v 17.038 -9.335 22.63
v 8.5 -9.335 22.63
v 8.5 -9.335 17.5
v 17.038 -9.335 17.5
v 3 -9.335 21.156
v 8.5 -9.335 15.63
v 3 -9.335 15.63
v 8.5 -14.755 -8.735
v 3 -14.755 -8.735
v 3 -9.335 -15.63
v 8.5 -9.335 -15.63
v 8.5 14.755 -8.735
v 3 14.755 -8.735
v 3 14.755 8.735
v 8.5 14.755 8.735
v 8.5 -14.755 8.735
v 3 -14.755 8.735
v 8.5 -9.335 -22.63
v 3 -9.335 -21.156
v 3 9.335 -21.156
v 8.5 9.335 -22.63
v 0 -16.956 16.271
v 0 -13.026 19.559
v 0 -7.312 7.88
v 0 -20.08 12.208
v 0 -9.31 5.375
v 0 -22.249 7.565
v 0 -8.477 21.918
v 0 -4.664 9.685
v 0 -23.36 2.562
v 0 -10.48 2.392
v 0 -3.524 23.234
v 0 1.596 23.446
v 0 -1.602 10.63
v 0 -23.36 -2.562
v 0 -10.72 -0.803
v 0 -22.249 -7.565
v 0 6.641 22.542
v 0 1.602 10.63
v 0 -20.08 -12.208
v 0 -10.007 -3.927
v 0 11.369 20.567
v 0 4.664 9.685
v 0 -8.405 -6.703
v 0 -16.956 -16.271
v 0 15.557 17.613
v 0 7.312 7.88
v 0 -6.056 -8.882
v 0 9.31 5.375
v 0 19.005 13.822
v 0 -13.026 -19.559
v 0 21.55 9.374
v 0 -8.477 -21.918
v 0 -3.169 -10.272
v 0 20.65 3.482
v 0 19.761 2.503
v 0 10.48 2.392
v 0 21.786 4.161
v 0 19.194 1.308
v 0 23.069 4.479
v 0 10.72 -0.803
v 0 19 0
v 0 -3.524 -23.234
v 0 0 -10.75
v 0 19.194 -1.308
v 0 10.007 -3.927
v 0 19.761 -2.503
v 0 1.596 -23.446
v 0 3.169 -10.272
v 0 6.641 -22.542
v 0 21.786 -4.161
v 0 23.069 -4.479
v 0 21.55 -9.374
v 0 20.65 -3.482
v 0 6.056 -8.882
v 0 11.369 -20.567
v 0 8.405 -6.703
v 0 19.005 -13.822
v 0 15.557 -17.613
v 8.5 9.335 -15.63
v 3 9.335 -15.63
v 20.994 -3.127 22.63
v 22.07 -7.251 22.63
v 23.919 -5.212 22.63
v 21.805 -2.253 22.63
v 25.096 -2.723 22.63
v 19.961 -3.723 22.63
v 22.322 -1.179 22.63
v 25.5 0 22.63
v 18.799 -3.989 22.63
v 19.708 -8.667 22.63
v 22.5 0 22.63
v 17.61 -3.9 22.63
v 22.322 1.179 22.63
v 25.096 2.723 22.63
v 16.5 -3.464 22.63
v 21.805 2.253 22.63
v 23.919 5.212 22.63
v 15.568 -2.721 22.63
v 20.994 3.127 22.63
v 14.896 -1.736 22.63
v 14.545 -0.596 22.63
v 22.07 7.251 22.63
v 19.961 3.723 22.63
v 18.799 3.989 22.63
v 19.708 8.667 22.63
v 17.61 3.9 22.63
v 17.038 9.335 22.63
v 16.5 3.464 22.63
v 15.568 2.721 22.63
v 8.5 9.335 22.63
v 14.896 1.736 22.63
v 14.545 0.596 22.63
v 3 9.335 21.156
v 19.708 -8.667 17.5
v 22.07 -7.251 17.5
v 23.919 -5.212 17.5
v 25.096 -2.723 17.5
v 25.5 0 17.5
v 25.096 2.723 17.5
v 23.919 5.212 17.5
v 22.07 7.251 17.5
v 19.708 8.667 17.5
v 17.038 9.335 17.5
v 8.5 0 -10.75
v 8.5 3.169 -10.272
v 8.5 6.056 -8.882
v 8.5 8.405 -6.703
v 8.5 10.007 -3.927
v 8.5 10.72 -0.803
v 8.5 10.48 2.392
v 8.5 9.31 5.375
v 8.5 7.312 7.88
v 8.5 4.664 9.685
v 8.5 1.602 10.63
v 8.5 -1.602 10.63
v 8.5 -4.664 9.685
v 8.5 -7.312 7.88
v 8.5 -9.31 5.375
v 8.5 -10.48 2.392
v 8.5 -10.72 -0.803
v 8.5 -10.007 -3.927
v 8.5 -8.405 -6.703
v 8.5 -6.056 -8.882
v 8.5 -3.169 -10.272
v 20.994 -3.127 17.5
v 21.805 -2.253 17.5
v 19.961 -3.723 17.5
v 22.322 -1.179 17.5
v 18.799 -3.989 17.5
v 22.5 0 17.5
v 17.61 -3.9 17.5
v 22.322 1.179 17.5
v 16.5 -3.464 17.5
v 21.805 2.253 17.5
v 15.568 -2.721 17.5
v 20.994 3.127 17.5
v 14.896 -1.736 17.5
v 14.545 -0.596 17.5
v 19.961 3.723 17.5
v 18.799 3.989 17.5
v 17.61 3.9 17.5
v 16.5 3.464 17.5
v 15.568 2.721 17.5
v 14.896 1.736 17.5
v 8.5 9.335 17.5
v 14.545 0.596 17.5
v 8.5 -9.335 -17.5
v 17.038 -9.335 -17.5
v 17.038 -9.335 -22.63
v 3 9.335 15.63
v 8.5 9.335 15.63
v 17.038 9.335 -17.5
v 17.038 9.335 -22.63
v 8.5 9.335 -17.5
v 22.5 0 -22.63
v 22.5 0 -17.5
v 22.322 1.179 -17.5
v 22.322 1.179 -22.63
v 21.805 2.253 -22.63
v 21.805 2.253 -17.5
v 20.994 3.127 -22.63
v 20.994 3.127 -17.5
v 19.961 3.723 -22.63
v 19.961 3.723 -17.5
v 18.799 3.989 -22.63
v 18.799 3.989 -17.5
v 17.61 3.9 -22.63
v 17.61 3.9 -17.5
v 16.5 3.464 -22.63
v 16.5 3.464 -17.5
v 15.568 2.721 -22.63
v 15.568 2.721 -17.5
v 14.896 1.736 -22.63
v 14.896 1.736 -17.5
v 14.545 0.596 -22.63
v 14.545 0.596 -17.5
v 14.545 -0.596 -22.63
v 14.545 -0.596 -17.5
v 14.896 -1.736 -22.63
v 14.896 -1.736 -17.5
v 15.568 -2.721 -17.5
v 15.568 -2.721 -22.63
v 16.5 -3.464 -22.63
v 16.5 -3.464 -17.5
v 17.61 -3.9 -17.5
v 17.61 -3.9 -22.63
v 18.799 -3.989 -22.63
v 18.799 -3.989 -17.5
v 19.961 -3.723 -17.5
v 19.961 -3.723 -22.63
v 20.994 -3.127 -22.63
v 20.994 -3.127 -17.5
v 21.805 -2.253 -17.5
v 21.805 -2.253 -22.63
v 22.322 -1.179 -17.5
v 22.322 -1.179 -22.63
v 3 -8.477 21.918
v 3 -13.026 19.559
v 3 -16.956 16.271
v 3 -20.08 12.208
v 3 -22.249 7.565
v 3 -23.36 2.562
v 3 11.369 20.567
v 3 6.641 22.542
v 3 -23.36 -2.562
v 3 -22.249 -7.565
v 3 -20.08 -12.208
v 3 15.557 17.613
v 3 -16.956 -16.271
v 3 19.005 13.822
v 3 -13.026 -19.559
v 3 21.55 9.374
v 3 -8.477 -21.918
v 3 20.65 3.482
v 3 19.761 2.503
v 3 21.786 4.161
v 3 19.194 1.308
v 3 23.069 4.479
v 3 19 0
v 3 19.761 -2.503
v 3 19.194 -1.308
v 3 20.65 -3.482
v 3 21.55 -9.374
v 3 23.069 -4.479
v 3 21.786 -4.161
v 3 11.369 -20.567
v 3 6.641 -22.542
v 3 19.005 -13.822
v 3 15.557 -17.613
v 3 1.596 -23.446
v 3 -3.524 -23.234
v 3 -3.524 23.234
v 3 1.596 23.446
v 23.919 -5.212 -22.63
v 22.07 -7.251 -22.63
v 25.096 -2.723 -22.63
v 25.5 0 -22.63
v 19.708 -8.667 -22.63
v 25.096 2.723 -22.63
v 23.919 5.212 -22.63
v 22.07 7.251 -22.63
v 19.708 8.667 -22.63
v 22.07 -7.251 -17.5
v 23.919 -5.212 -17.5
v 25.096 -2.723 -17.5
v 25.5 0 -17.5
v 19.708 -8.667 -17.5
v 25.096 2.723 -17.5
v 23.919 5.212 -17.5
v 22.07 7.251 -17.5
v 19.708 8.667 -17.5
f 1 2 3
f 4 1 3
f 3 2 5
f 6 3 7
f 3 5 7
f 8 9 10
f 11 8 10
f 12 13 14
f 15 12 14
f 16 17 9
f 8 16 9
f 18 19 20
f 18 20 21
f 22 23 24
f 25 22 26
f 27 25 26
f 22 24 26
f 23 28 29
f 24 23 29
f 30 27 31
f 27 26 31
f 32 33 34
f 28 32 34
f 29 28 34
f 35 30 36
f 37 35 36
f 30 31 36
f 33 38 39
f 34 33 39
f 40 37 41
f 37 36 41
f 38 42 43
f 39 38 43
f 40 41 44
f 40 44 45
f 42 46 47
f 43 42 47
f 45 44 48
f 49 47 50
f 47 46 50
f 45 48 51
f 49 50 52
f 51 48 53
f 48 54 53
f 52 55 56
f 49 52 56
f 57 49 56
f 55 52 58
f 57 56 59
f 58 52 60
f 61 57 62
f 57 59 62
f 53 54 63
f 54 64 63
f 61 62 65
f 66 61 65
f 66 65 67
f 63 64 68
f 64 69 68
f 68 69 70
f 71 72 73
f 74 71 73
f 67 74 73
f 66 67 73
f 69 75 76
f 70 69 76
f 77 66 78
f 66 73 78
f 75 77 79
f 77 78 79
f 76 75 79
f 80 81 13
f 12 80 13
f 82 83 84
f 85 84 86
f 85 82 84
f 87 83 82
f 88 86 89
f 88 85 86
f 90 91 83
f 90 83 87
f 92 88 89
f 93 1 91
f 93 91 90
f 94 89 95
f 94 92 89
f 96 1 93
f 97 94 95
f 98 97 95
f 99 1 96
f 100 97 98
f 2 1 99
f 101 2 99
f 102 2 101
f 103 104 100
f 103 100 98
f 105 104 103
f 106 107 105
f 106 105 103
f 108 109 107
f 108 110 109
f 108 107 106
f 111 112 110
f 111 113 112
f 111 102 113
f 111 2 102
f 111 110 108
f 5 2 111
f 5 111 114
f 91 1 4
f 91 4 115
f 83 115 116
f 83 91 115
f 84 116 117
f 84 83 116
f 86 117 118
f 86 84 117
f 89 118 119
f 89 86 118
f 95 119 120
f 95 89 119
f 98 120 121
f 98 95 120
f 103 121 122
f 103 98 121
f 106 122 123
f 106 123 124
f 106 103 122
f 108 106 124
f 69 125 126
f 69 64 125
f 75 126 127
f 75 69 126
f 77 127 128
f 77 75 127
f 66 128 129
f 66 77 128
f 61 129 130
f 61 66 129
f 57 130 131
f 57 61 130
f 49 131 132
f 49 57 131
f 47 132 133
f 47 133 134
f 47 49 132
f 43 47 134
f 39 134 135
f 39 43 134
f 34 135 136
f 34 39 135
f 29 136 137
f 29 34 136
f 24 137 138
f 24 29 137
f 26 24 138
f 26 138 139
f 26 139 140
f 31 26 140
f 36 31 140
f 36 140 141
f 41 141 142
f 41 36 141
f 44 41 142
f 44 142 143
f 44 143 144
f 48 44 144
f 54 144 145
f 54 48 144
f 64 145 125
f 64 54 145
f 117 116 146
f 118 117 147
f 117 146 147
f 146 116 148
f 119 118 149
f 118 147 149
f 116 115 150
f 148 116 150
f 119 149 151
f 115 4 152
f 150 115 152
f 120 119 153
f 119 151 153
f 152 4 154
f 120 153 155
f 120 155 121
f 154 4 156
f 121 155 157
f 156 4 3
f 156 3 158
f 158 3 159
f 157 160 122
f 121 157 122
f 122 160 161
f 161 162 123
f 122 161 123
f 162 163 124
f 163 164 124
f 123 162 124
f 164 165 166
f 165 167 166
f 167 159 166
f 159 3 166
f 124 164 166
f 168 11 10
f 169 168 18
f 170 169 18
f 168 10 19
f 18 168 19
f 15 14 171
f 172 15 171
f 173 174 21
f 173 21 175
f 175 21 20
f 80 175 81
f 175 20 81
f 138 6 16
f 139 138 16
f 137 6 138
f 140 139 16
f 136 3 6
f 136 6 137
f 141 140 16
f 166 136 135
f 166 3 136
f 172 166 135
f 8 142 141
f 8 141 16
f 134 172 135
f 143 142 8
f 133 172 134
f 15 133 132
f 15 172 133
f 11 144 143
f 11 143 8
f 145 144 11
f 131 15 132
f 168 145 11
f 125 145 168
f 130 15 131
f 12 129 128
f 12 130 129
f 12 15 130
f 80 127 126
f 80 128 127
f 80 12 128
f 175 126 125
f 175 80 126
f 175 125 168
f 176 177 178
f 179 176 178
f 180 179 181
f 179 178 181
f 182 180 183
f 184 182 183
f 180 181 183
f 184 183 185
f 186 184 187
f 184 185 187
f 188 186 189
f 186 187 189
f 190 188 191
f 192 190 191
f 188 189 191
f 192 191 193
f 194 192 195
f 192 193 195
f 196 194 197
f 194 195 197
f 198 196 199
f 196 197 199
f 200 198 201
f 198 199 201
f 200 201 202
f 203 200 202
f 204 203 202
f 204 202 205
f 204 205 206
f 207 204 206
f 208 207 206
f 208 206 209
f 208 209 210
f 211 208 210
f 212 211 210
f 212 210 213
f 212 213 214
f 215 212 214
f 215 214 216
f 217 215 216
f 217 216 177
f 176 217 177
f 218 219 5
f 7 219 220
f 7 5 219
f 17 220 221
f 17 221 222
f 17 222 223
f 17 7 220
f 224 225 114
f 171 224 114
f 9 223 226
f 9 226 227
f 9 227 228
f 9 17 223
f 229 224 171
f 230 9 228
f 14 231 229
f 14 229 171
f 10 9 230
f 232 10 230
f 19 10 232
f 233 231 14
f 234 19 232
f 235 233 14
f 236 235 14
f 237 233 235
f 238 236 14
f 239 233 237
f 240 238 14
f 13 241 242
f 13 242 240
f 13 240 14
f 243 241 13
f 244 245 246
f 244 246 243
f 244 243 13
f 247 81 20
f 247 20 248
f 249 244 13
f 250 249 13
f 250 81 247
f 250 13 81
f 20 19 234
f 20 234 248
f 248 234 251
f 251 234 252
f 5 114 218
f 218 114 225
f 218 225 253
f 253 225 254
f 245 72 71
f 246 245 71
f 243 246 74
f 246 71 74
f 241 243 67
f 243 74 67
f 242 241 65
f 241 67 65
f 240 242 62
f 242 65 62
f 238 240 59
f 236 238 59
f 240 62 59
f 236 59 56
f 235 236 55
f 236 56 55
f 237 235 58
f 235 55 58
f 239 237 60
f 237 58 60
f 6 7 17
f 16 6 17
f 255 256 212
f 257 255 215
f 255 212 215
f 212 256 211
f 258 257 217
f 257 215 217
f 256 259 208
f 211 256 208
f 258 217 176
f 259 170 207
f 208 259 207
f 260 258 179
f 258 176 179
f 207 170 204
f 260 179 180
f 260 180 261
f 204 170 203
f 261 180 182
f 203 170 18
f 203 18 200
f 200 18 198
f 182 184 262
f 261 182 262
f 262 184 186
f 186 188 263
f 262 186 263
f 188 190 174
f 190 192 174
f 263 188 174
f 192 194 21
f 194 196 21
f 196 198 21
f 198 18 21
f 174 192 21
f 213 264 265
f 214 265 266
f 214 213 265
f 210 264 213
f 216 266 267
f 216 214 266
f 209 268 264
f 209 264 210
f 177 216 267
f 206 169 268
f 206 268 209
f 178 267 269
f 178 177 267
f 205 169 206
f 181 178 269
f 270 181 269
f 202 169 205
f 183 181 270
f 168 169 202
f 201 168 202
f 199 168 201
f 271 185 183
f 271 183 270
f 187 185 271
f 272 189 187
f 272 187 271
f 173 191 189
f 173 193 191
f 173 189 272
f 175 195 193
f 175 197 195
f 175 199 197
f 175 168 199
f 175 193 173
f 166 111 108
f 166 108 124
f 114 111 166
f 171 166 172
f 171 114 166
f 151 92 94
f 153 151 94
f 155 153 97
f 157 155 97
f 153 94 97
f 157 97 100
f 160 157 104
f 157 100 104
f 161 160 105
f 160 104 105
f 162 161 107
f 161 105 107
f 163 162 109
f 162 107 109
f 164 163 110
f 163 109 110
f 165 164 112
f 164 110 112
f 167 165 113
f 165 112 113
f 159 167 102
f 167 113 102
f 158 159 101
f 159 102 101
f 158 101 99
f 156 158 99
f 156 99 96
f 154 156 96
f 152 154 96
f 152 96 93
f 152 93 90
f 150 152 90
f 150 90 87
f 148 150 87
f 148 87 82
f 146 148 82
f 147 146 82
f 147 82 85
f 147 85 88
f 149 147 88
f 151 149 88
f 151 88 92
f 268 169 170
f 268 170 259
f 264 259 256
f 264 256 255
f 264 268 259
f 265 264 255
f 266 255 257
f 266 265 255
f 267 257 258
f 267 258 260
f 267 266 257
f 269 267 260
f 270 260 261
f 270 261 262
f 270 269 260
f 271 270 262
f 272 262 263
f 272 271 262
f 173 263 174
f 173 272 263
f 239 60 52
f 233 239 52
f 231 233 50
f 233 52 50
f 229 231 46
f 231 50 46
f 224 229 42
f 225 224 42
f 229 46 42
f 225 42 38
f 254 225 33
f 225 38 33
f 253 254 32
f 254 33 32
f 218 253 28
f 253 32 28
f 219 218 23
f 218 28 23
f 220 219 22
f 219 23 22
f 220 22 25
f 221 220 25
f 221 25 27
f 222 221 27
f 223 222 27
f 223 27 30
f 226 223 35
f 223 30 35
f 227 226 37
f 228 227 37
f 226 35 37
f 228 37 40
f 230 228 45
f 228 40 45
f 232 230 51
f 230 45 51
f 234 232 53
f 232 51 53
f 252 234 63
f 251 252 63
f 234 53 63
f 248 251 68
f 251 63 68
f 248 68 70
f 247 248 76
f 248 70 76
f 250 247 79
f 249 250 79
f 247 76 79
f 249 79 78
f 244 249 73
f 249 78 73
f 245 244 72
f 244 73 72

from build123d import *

# Parameters (mm, degrees)
SKETCH1_R           = 10.75
BOSS_EXTRUDE1_DEPTH = 3
SKETCH2_R           = 10.75
BOSS_EXTRUDE2_DEPTH = 5.5
DRAFT1_START        = -9.335
DRAFT1_DEPTH        = 18.67
SKETCH3_W           = 5.13
SKETCH3_H           = 18.67
BOSS_EXTRUDE3_DEPTH = 17
CUT_EXTRUDE1_REACH  = 59.71
CUT_EXTRUDE2_REACH  = 59.71
SKETCH5_R           = 4


# Read off the part's stored shape, not the designer's step: Draft1
with BuildPart() as part:
    # Sketch1 → Boss-Extrude1 (new body)
    with BuildSketch(Plane(origin=(0, 0, 0), x_dir=(0, 0, -1), z_dir=(1, 0, 0))):
        with BuildLine():
            ThreePointArc((-4.479326664, 23.069148936), (0, -23.5), (4.479326664, 23.069148936))
            ThreePointArc((4.479326664, 23.069148936), (0, 19), (-4.479326664, 23.069148936))
        make_face()
        Circle(SKETCH1_R, mode=Mode.SUBTRACT)
    extrude(amount=BOSS_EXTRUDE1_DEPTH)

    # Sketch2 → Boss-Extrude2 (add)
    # profile 1 of 7: a face of its own
    with BuildSketch(Plane(origin=(3, 0, 0), x_dir=(0, 0, -1), z_dir=(1, 0, 0))):
        with BuildLine():
            ThreePointArc((-22.63, 6.33506906), (-22.149027068, 7.853063093), (-21.566357481, 9.335))
            Line((-21.566357481, 9.335), (-22.63, 9.335))
            Line((-22.63, 9.335), (-22.63, 6.33506906))
        make_face()
    # profile 2 of 7: a face of its own
    with BuildSketch(Plane(origin=(3, 0, 0), x_dir=(0, 0, -1), z_dir=(1, 0, 0))):
        with BuildLine():
            Line((-15.63, -9.335), (-15.63, 9.335))
            Line((-15.63, 9.335), (-21.566357481, 9.335))
            ThreePointArc((-21.566357481, 9.335), (-22.149027068, 7.853063093), (-22.63, 6.33506906))
            Line((-22.63, 6.33506906), (-22.63, -6.33506906))
            ThreePointArc((-22.63, -6.33506906), (-22.149027068, -7.853063093), (-21.566357481, -9.335))
            Line((-21.566357481, -9.335), (-15.63, -9.335))
        make_face()
    # profile 3 of 7: a face of its own
    with BuildSketch(Plane(origin=(3, 0, 0), x_dir=(0, 0, -1), z_dir=(1, 0, 0))):
        with BuildLine():
            Line((-22.63, -9.335), (-21.566357481, -9.335))
            ThreePointArc((-21.566357481, -9.335), (-22.149027068, -7.853063093), (-22.63, -6.33506906))
            Line((-22.63, -6.33506906), (-22.63, -9.335))
        make_face()
    # profile 4 of 7: a face of its own
    with BuildSketch(Plane(origin=(3, 0, 0), x_dir=(0, 0, -1), z_dir=(1, 0, 0))):
        Polygon((-8.735, -14.754582548), (8.735, -14.754582548), (15.63, -9.335), (15.63, 9.335), (8.735, 14.754582548), (-8.735, 14.754582548), (-15.63, 9.335), (-15.63, -9.335), align=None)
        Circle(SKETCH2_R, mode=Mode.SUBTRACT)
    # profile 5 of 7: a face of its own
    with BuildSketch(Plane(origin=(3, 0, 0), x_dir=(0, 0, -1), z_dir=(1, 0, 0))):
        with BuildLine():
            Line((21.566357481, 9.335), (15.63, 9.335))
            Line((15.63, 9.335), (15.63, -9.335))
            Line((15.63, -9.335), (21.566357481, -9.335))
            ThreePointArc((21.566357481, -9.335), (22.149027068, -7.853063093), (22.63, -6.33506906))
            Line((22.63, -6.33506906), (22.63, 6.33506906))
            ThreePointArc((22.63, 6.33506906), (22.149027068, 7.853063093), (21.566357481, 9.335))
        make_face()
    # profile 6 of 7: a face of its own
    with BuildSketch(Plane(origin=(3, 0, 0), x_dir=(0, 0, -1), z_dir=(1, 0, 0))):
        with BuildLine():
            ThreePointArc((22.63, -6.33506906), (22.149027068, -7.853063093), (21.566357481, -9.335))
            Line((21.566357481, -9.335), (22.63, -9.335))
            Line((22.63, -9.335), (22.63, -6.33506906))
        make_face()
    # profile 7 of 7: a face of its own
    with BuildSketch(Plane(origin=(3, 0, 0), x_dir=(0, 0, -1), z_dir=(1, 0, 0))):
        with BuildLine():
            Line((22.63, 9.335), (21.566357481, 9.335))
            ThreePointArc((21.566357481, 9.335), (22.149027068, 7.853063093), (22.63, 6.33506906))
            Line((22.63, 6.33506906), (22.63, 9.335))
        make_face()
    extrude(amount=BOSS_EXTRUDE2_DEPTH)

    # Draft1 outline → Draft1 (cut)
    with BuildSketch(Plane(origin=(0, 0, 0), x_dir=(1, 0, 0), z_dir=(0, 1, 0)).offset(DRAFT1_START)):
        Polygon((3, 22.63), (3, 21.156279442), (8.5, 22.63), align=None)
        Polygon((3, -21.156279442), (3, -22.63), (8.5, -22.63), align=None)
    extrude(amount=DRAFT1_DEPTH, mode=Mode.SUBTRACT)

    # Sketch3 → Boss-Extrude3 (add)
    with BuildSketch(Plane(origin=(8.5, 0, 0), x_dir=(0, 0, -1), z_dir=(1, 0, 0))):
        with Locations((-20.065, 0)):
            Rectangle(SKETCH3_W, SKETCH3_H)
        with Locations((20.065, 0)):
            Rectangle(SKETCH3_W, SKETCH3_H)
    extrude(amount=BOSS_EXTRUDE3_DEPTH)

    # Cut-Extrude1: up to this face of the body (flat: up to its plane)
    cut_extrude1_end = Plane(part.part.faces().sort_by_distance((17, 0, -22.63))[0])
    # Sketch4 → Cut-Extrude1 (cut, up to the picked face)
    with BuildSketch(Plane.XY.offset(22.63), mode=Mode.PRIVATE) as cut_extrude1_sk1:
        with BuildLine():
            Line((17.037700932, 12.875), (29.477700932, 12.875))
            Line((29.477700932, 12.875), (29.477700932, -13.095))
            Line((29.477700932, -13.095), (17.037700932, -13.095))
            Line((17.037700932, -13.095), (17.037700932, -9.335))
            ThreePointArc((17.037700932, -9.335), (25.5, 0), (17.037700932, 9.335))
            Line((17.037700932, 9.335), (17.037700932, 12.875))
        make_face()
    cut_extrude1_tool1 = split(extrude(cut_extrude1_sk1.sketch, amount=-CUT_EXTRUDE1_REACH, mode=Mode.PRIVATE), bisect_by=cut_extrude1_end, keep=Keep.BOTH, mode=Mode.PRIVATE)
    add(cut_extrude1_tool1.solids().sort_by(Axis((17.325658, 11.105, 22.63), (0, 0, -1)))[0], mode=Mode.SUBTRACT)

    # Cut-Extrude2: up to this face of the body (flat: up to its plane)
    cut_extrude2_end = Plane(part.part.faces().sort_by_distance((16.149048437, 0, -22.63))[0])
    # Sketch5 → Cut-Extrude2 (cut, up to the picked face)
    with BuildSketch(Plane.XY.offset(22.63), mode=Mode.PRIVATE) as cut_extrude2_sk1:
        with Locations((18.5, 0)):
            Circle(SKETCH5_R)
    cut_extrude2_tool1 = split(extrude(cut_extrude2_sk1.sketch, amount=-CUT_EXTRUDE2_REACH, mode=Mode.PRIVATE), bisect_by=cut_extrude2_end, keep=Keep.BOTH, mode=Mode.PRIVATE)
    add(cut_extrude2_tool1.solids().sort_by(Axis((18.5, 0, 22.63), (0, 0, -1)))[0], mode=Mode.SUBTRACT)


solid = part.part
